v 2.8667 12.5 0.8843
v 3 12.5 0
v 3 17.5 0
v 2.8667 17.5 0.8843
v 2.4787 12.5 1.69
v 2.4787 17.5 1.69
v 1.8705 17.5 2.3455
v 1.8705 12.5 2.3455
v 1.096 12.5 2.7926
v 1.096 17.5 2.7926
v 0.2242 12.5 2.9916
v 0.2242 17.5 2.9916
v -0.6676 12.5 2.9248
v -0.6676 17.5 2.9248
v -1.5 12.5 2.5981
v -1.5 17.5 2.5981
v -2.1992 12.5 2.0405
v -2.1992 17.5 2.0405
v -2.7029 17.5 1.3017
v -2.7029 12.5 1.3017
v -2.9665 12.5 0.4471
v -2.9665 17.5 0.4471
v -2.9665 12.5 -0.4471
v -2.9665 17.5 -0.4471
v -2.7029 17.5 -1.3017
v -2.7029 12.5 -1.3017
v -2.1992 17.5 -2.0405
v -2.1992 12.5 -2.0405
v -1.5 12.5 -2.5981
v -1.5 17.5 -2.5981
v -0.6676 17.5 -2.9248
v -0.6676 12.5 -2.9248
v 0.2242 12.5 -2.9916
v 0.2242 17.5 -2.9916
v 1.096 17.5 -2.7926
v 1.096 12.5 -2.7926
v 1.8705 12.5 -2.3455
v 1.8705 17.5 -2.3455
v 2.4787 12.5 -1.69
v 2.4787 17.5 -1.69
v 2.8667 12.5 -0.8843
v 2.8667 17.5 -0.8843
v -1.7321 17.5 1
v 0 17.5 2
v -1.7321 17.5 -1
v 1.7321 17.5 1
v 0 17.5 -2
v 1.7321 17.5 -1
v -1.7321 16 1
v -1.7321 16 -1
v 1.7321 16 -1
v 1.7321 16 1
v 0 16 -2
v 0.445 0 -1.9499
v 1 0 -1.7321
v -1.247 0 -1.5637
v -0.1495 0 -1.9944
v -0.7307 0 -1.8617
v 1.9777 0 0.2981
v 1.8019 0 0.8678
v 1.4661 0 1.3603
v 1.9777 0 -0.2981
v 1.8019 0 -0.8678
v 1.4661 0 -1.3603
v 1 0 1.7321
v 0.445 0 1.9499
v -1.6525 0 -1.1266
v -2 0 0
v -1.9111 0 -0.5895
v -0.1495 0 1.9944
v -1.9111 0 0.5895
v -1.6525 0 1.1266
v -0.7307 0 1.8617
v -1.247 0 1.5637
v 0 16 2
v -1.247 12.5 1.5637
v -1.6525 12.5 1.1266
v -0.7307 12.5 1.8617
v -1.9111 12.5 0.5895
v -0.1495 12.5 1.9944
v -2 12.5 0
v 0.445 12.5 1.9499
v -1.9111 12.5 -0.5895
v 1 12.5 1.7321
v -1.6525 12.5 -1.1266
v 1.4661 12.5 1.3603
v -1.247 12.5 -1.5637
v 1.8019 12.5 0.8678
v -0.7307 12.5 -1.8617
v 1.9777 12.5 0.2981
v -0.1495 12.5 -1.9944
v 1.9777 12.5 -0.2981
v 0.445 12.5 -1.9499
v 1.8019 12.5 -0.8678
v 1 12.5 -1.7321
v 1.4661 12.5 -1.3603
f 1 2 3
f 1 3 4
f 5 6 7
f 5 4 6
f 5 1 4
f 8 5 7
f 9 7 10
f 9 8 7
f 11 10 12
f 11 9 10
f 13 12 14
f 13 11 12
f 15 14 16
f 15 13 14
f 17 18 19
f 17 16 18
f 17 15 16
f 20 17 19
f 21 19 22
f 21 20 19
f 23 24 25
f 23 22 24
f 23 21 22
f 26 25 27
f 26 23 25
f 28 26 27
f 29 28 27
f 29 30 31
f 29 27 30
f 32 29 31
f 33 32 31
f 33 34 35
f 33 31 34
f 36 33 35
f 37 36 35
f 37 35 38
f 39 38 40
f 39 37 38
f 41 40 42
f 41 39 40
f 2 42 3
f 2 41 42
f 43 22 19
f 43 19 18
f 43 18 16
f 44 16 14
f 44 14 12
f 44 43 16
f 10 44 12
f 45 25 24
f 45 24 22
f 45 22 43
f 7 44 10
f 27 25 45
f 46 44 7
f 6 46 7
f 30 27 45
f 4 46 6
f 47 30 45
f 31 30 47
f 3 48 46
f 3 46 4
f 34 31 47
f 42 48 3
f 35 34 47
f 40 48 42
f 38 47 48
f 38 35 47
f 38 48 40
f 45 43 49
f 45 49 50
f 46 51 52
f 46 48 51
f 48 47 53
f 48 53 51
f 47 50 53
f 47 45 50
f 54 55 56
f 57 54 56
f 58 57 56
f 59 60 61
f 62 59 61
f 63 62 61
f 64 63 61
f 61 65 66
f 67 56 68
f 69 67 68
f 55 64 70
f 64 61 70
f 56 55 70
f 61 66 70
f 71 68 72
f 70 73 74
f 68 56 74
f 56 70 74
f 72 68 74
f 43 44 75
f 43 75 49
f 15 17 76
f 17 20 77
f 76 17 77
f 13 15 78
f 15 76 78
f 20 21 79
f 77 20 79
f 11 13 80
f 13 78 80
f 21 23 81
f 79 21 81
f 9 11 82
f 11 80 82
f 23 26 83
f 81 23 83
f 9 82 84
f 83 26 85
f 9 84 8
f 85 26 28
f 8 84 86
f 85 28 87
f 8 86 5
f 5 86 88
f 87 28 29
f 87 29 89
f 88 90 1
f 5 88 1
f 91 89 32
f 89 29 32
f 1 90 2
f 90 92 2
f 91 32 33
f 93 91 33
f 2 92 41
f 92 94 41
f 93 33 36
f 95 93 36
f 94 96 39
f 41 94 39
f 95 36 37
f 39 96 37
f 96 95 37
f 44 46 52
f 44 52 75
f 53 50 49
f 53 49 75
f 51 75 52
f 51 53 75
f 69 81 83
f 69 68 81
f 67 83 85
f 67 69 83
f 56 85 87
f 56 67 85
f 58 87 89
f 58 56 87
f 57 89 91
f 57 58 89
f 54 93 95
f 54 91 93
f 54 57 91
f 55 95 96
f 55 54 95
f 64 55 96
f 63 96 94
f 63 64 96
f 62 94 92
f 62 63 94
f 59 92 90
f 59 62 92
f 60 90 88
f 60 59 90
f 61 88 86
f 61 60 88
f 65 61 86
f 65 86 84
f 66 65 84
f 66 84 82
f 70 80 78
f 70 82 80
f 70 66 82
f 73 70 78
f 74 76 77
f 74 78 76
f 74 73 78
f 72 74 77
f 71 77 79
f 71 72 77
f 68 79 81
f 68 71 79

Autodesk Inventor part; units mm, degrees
ref_plane "YZ Plane" through (0, 0, 0) normal (1, 0, 0) x (0, 1, 0)
ref_plane "XZ Plane" through (0, 0, 0) normal (0, 1, 0) x (-1, 0, 0)
ref_plane "XY Plane" through (0, 0, 0) normal (0, 0, 1) x (1, 0, 0)
sketch "Sketch1" plane through (0, 0, 0) normal (0, 1, 0) x (-1, 0, 0)
  circle A0 centre (0, 0) radius 2
  dimension "d0" = 4
extrude "Extrusion1" add sketch "Sketch1" along normal blind 12.5
sketch "Sketch2" plane through (0, 12.5, 0) normal (0, 1, 0) x (1, 0, 0)
  circle A0 centre (0, 0) radius 3
  dimension "d3" = 6
extrude "Extrusion2" add sketch "Sketch2" along normal blind 5
sketch "Sketch3" plane through (0, 17.5, 0) normal (0, 1, 0) x (1, 0, 0)
  circle A0 centre (0, 0) radius 2 projected
  line L0 (0, 2) -> (1.7321, 1)
  line L1 (1.7321, 1) -> (1.7321, -1)
  line L2 (1.7321, -1) -> (0, -2)
  line L3 (0, -2) -> (-1.7321, -1)
  line L4 (-1.7321, -1) -> (-1.7321, 1)
  line L5 (-1.7321, 1) -> (0, 2)
extrude "Extrusion3" cut sketch "Sketch3" against normal blind 1.5 contours L1 L2 L3 L4 L5 L0
thread "Thread1" size "M4x0.5" class "6g" standard "ANSI Metric M Profile" length 20
properties part number "4mm_0.5_Screw"
